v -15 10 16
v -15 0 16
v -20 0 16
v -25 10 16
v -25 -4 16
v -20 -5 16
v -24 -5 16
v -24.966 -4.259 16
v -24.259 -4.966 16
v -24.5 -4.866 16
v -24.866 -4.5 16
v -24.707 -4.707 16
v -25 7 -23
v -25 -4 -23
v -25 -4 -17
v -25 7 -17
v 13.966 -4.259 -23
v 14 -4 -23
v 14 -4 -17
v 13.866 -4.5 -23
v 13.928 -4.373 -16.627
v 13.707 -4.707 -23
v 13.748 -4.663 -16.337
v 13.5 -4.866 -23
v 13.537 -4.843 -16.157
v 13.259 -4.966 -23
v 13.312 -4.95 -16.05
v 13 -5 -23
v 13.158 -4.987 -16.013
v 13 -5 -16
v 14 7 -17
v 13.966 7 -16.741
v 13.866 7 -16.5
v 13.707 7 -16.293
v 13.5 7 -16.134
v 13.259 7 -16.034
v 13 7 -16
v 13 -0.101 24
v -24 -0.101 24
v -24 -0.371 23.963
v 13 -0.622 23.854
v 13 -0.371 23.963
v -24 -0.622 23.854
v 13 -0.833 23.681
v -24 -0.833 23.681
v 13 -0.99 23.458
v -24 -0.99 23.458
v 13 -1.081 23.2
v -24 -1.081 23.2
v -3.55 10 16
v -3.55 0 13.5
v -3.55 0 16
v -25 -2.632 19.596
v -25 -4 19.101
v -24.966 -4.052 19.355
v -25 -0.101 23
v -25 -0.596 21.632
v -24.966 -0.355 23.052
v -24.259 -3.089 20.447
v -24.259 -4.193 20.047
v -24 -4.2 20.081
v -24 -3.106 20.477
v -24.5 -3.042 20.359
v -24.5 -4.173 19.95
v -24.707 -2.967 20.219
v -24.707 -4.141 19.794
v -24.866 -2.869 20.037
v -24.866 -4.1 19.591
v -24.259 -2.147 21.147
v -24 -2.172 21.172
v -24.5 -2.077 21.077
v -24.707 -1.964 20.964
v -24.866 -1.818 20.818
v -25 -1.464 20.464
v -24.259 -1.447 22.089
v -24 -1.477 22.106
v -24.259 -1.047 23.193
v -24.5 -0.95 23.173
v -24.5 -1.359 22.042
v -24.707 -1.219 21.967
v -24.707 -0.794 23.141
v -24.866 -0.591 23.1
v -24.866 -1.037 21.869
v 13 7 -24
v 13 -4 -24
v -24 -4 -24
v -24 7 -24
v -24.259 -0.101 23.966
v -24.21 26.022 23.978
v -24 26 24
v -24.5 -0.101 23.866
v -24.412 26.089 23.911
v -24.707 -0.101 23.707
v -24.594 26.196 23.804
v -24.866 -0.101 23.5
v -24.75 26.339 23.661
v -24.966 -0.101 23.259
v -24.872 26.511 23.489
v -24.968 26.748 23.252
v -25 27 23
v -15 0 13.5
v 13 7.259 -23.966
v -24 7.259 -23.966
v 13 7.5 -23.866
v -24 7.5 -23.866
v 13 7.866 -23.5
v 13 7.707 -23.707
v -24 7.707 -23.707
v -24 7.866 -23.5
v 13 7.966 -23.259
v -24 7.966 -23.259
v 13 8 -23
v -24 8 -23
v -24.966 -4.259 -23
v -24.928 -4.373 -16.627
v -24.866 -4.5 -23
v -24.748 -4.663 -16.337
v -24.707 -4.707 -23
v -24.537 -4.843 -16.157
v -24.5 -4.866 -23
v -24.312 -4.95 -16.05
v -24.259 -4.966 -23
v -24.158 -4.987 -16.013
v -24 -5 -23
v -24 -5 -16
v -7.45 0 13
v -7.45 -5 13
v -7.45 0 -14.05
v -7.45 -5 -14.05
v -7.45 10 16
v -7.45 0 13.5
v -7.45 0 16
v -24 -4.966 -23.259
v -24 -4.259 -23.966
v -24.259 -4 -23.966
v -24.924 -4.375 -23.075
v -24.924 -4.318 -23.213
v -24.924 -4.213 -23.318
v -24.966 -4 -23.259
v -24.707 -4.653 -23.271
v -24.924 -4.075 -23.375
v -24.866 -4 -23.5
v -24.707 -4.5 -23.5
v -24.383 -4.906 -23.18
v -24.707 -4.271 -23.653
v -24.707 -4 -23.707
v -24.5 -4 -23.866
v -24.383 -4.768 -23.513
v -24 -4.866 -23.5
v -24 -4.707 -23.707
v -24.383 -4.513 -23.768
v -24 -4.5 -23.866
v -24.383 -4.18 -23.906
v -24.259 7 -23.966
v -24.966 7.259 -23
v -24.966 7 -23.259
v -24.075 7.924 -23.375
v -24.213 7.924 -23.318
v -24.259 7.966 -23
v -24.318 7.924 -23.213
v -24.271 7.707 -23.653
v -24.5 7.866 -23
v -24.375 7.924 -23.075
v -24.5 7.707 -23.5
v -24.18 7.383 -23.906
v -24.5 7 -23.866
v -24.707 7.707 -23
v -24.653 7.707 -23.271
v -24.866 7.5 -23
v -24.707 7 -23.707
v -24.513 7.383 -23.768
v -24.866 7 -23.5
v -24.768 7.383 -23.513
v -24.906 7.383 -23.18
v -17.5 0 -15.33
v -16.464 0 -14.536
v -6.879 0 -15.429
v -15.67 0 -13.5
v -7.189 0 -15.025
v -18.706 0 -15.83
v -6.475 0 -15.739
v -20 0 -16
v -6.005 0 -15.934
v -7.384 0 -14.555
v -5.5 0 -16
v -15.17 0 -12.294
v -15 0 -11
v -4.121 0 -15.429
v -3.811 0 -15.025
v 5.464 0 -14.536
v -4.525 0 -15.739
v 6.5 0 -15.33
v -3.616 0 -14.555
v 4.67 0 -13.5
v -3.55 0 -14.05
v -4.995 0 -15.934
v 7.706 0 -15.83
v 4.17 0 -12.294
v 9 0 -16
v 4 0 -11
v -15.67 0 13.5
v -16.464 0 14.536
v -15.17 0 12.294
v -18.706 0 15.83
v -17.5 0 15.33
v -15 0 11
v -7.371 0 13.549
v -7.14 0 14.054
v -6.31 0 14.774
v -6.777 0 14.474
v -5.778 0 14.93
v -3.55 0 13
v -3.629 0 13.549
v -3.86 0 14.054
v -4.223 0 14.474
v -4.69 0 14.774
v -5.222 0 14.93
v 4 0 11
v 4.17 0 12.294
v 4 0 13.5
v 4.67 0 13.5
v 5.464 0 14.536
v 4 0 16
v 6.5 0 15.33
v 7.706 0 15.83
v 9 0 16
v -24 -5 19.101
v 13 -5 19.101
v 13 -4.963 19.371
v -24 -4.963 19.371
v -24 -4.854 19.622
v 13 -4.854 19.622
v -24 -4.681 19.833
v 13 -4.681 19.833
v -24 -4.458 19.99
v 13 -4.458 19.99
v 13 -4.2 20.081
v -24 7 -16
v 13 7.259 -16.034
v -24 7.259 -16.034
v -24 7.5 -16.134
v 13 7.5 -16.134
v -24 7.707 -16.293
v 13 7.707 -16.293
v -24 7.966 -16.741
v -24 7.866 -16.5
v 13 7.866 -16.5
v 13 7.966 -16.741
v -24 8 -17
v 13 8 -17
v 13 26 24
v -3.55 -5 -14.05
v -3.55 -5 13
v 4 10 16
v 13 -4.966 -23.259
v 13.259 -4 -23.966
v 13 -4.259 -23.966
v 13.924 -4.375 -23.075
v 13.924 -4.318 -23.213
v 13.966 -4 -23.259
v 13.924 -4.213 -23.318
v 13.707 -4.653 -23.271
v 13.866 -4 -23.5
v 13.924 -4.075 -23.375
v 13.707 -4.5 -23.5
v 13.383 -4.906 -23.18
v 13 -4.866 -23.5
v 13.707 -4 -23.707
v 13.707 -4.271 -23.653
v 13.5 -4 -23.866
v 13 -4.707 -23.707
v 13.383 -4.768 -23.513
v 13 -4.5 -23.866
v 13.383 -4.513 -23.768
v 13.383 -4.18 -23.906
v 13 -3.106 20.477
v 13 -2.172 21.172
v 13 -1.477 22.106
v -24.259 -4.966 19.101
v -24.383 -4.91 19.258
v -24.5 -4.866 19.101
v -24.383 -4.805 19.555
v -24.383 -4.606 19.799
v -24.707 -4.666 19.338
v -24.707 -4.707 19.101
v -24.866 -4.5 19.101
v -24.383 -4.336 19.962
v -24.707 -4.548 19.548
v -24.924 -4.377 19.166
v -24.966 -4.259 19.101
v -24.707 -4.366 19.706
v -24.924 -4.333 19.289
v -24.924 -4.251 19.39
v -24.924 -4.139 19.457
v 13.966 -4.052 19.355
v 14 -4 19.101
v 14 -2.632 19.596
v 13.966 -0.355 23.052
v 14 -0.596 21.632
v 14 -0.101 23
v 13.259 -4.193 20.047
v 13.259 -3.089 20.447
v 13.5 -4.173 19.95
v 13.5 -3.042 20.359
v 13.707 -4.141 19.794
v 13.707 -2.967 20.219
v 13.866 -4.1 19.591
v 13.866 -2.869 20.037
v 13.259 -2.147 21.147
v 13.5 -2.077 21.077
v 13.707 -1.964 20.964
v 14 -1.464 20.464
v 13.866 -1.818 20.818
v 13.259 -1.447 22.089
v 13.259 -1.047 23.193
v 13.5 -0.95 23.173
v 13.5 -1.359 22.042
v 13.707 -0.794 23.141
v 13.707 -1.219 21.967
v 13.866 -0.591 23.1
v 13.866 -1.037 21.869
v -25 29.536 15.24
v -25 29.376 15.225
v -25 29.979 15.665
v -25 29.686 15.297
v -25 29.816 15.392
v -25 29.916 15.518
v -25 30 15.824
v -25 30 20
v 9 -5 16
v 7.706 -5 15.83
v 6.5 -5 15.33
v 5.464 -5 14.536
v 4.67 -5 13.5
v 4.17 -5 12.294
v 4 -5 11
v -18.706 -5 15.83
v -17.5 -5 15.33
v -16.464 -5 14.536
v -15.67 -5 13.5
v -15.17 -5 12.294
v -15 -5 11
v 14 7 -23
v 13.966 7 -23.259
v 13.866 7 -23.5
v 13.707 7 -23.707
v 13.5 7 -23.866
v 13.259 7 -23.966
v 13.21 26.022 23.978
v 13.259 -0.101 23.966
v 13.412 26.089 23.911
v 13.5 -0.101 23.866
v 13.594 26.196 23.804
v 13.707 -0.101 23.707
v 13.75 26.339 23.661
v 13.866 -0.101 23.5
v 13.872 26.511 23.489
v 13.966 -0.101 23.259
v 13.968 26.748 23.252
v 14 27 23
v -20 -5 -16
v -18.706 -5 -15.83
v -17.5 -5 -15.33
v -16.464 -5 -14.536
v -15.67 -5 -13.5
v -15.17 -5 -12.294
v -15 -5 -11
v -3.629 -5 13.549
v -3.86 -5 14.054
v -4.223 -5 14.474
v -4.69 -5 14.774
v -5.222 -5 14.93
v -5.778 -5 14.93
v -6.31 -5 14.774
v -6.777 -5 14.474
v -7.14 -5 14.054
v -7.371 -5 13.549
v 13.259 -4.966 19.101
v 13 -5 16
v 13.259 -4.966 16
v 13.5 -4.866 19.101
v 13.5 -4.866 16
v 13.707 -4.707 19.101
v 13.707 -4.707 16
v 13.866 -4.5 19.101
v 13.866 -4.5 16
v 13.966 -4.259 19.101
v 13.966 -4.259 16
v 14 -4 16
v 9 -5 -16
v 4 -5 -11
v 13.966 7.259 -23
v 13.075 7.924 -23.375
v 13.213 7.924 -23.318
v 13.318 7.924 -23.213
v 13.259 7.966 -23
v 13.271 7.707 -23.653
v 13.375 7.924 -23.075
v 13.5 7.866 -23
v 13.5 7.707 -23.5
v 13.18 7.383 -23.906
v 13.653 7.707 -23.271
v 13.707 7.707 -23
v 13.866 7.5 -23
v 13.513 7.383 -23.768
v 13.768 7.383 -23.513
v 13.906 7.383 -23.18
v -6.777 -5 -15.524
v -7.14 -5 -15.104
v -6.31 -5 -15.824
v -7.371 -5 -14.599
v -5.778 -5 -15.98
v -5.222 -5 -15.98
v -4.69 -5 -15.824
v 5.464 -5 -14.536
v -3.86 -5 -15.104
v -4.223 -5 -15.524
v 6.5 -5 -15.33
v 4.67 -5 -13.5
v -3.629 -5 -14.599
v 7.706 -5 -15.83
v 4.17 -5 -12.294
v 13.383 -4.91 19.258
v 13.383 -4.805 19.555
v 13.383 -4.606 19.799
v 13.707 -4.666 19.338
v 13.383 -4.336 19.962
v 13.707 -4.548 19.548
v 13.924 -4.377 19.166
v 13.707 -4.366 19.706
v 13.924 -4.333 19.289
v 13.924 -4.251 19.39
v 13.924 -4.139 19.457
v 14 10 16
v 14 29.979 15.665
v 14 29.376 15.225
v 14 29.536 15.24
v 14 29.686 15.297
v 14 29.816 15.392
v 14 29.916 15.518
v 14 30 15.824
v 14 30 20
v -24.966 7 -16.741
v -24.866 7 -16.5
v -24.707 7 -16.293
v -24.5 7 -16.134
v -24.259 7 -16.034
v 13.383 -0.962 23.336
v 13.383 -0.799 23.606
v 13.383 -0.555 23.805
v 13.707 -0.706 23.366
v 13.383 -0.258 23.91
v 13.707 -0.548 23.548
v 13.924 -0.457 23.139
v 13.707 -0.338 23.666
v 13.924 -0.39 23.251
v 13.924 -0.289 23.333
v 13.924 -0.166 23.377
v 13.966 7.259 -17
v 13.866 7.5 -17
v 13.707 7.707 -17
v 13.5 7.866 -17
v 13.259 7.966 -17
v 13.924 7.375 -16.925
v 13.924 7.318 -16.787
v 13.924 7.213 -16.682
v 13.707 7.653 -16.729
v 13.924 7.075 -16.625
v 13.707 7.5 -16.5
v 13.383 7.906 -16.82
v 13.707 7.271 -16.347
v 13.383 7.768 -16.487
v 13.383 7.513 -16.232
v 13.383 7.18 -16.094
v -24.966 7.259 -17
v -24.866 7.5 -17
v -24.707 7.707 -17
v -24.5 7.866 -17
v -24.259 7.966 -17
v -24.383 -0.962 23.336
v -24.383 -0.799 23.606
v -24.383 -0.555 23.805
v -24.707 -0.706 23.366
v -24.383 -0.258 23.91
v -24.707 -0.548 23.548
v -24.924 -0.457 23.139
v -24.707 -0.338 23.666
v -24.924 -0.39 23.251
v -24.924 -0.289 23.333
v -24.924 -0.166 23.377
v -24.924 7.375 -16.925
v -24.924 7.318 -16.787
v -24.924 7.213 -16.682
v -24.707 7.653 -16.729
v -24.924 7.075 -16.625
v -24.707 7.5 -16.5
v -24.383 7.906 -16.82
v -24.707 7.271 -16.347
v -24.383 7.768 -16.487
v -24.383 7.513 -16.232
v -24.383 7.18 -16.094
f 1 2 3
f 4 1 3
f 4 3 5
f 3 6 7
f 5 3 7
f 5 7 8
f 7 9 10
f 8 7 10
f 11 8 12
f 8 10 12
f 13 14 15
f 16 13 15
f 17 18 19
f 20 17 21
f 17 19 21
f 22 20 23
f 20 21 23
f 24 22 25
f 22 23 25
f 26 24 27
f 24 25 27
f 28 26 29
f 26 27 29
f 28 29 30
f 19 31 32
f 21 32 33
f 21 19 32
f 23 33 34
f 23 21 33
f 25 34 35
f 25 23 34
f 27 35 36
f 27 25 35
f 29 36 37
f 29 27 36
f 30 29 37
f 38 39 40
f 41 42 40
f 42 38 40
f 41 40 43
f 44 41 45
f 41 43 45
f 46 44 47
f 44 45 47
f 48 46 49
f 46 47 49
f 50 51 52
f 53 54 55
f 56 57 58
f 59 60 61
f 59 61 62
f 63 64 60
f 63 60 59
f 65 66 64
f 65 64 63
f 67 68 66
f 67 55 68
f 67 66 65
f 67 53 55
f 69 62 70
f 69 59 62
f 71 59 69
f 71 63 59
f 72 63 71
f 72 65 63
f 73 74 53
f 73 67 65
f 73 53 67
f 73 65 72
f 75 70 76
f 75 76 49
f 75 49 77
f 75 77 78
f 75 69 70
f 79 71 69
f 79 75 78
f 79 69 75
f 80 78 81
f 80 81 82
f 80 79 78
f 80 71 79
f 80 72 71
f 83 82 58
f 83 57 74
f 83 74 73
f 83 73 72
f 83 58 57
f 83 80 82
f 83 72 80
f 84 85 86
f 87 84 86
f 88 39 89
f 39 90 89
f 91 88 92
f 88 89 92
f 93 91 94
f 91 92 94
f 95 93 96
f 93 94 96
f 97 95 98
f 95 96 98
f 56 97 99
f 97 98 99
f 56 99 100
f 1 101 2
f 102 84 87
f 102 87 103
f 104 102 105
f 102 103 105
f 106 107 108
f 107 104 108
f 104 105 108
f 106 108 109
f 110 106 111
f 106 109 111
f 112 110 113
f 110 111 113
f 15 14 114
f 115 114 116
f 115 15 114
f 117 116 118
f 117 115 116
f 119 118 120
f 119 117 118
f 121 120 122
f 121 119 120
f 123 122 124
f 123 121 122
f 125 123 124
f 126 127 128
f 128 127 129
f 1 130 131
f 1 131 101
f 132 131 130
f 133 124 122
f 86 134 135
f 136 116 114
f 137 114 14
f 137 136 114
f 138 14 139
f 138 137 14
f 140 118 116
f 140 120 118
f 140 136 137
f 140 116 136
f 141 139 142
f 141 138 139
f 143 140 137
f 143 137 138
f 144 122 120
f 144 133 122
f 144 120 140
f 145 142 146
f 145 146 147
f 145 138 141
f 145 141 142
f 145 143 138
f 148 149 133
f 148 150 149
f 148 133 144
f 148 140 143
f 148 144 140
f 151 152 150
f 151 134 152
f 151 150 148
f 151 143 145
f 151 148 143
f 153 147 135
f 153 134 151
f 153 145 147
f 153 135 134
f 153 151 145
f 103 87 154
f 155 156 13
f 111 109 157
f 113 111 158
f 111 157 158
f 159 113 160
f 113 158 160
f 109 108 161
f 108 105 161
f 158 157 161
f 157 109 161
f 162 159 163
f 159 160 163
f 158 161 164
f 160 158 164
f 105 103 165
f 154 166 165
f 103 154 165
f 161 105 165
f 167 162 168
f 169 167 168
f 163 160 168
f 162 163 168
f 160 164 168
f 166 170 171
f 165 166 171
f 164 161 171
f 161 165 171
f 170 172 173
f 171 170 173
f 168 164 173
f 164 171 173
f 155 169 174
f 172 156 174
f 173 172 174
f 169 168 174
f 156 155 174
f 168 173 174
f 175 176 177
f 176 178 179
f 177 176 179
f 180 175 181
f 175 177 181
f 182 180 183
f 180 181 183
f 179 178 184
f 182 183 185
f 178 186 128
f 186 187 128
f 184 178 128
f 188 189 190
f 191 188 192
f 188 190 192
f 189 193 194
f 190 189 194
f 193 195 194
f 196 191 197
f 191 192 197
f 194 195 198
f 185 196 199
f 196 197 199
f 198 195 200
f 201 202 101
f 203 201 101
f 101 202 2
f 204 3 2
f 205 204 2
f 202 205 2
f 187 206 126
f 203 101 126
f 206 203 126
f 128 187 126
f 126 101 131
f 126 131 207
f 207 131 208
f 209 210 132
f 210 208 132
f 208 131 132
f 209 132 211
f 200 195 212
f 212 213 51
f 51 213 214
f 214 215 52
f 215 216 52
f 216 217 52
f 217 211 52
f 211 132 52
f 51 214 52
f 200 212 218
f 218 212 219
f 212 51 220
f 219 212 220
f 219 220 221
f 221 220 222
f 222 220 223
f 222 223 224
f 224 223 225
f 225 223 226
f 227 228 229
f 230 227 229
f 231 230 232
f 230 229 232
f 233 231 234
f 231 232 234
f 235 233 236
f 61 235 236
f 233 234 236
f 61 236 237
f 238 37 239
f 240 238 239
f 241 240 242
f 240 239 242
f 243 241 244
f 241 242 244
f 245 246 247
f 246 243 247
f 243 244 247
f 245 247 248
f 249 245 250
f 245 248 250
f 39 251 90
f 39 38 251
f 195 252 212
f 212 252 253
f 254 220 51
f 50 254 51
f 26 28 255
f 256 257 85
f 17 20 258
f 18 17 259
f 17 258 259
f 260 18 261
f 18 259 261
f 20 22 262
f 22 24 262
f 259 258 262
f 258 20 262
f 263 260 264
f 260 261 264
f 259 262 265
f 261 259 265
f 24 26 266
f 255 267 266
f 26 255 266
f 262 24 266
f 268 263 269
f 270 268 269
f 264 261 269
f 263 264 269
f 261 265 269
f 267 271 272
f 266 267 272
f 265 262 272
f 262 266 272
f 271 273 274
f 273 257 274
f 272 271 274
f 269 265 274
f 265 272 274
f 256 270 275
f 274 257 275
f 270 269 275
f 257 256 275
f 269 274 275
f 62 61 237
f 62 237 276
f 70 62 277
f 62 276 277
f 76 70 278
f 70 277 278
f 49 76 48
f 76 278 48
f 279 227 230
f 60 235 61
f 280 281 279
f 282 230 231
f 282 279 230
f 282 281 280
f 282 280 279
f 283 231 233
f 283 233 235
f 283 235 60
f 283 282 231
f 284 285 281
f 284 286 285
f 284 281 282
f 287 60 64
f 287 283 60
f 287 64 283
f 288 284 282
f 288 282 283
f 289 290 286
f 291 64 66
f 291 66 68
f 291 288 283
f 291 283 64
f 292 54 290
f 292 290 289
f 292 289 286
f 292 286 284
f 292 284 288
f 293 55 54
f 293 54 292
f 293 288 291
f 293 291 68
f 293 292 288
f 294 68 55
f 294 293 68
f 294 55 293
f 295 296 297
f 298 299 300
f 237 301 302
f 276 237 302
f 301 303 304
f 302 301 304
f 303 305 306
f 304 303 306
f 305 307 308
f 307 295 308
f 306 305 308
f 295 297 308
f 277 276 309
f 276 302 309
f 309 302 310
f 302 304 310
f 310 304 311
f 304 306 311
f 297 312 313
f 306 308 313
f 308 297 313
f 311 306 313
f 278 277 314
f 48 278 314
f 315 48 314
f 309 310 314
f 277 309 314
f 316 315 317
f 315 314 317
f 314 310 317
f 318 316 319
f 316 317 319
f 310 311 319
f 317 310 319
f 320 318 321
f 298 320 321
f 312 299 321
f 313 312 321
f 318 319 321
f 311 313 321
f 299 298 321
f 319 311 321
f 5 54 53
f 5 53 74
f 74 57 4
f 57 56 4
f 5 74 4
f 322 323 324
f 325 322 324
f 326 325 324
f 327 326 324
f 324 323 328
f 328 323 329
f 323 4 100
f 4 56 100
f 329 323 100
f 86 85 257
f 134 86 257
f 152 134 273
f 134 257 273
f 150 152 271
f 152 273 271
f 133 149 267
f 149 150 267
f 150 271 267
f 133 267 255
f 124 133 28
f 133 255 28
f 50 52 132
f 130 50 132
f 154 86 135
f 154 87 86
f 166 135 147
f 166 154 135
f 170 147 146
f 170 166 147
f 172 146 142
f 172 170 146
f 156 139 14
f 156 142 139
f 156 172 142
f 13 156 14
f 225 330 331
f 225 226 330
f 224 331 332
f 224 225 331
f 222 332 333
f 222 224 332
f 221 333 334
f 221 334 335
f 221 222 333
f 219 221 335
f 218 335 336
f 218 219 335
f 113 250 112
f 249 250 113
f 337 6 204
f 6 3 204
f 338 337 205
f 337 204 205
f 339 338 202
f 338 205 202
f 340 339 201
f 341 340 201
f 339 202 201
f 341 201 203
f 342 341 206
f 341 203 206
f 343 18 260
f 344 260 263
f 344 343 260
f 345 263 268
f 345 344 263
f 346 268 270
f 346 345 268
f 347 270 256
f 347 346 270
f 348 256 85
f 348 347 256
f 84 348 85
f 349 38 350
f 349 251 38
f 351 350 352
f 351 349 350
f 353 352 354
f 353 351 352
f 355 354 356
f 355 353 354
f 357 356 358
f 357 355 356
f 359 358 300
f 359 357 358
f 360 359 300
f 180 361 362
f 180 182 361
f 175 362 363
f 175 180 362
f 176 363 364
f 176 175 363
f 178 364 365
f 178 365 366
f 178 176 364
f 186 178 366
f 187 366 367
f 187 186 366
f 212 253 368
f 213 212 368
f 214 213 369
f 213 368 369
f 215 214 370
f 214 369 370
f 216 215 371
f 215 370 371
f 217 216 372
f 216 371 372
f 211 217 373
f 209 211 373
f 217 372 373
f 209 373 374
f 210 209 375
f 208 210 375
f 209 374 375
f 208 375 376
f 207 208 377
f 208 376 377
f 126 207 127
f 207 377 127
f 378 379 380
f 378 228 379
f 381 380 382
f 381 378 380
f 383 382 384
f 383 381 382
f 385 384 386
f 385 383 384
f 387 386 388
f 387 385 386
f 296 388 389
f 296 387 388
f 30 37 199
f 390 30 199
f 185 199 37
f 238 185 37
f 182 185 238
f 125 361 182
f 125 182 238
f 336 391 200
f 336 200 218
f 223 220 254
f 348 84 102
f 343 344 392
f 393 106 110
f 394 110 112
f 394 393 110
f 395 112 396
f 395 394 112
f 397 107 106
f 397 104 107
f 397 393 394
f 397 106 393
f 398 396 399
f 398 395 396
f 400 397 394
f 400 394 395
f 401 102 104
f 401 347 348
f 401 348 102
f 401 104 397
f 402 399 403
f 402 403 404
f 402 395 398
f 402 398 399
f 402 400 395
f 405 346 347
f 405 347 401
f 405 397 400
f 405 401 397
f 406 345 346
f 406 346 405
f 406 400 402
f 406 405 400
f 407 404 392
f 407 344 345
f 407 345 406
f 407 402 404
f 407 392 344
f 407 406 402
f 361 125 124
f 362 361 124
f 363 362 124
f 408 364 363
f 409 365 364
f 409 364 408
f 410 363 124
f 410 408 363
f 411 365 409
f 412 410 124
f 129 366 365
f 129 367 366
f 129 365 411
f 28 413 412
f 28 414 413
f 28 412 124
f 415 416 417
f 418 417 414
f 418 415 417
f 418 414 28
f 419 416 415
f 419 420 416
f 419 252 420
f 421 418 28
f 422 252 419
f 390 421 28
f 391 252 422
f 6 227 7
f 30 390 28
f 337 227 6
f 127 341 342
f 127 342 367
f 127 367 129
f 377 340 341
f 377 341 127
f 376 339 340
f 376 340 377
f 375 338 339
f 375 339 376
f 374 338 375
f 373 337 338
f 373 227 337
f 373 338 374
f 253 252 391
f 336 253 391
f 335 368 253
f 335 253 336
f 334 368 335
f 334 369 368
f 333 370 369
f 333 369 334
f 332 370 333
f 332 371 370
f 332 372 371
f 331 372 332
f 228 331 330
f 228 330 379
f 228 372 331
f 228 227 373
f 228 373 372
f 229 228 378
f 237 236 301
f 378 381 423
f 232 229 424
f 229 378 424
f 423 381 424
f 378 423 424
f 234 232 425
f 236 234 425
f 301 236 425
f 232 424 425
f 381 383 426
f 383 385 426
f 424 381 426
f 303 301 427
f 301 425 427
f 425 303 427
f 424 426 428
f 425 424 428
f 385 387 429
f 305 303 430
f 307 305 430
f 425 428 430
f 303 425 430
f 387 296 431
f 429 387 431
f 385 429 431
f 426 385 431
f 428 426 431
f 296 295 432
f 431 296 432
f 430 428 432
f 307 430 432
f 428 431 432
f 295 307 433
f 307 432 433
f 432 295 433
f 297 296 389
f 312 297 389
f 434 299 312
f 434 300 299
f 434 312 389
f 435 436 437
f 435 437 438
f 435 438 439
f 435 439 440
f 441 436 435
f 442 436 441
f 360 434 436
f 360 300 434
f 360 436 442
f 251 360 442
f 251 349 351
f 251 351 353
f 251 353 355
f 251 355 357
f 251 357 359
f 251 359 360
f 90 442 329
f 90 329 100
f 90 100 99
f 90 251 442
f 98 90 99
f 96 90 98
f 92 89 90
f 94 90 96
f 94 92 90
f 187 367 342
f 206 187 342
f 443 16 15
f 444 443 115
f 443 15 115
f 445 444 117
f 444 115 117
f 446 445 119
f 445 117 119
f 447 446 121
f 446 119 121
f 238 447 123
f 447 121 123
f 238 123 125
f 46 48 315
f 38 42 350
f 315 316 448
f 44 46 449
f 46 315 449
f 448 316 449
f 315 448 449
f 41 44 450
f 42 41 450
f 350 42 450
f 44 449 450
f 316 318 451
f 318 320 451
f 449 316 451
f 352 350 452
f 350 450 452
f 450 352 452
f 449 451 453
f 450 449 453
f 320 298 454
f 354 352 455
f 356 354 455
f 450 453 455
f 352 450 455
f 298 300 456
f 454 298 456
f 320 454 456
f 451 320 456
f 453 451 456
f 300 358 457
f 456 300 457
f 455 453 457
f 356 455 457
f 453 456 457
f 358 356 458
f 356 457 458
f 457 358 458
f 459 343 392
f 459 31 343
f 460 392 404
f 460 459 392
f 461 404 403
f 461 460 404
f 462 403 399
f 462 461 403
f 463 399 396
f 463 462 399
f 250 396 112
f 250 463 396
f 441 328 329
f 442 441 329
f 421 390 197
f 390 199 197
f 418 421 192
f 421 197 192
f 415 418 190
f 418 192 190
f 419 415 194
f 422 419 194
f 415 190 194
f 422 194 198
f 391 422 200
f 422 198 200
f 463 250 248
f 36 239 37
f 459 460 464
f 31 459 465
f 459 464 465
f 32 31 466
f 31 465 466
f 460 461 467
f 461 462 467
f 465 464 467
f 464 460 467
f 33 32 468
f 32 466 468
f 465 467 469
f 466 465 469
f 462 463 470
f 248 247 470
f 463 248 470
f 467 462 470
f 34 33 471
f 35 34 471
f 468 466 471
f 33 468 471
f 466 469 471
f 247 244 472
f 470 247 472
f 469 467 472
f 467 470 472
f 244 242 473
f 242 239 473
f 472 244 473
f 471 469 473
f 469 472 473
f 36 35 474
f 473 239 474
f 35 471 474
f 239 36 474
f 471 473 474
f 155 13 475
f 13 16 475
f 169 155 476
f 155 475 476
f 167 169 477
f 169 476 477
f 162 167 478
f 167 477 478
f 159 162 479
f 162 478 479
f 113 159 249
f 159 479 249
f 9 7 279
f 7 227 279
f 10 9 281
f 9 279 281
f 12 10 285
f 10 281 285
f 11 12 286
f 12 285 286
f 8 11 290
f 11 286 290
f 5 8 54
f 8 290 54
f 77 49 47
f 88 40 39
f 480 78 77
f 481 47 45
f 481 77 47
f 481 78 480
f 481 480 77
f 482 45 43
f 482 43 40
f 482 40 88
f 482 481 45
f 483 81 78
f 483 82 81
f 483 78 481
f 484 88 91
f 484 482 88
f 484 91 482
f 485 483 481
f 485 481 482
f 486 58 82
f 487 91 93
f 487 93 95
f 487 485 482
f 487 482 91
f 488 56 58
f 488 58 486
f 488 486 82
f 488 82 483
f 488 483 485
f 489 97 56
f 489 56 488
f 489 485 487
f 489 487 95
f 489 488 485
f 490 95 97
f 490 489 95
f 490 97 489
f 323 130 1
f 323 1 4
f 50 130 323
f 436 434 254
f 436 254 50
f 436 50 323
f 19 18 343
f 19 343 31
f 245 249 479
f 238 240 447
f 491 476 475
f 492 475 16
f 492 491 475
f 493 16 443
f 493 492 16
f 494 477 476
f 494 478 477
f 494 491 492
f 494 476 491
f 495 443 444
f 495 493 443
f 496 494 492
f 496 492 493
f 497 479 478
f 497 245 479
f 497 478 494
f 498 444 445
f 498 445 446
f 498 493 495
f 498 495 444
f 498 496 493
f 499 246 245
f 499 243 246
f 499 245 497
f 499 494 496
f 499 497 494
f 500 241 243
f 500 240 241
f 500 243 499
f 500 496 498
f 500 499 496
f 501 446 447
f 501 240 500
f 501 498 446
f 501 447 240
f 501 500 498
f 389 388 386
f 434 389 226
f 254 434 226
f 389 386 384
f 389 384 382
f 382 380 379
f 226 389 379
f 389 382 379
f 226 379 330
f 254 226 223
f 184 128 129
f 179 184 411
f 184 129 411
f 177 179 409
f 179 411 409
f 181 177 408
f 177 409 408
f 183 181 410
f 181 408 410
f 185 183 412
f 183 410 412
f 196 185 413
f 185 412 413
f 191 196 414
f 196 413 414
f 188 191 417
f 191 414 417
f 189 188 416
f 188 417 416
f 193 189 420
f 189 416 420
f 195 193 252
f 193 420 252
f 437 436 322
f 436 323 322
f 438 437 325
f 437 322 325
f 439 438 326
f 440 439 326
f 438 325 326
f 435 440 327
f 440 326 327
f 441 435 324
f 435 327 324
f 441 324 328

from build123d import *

# Parameters (mm, degrees)
F0_W      = 39
F0_H      = 48
F1_DEPTH  = 5
F2_W      = 10
F2_H      = 32
F3_DEPTH  = 5.001
F4_W      = 39
F4_H      = 8
F5_DEPTH  = 30
F7_DEPTH  = 39
F8_R      = 4
F9_DEPTH  = 39.001
F10_R     = 1
F11_SIZE  = 4
F12_W     = 39
F12_H     = 8
F13_DEPTH = 8
F15_DEPTH = 35.001
F16_R     = 1
F17_R     = 5
F18_R     = 0.6
F19_W     = 7.55
F19_H     = 2.5
F20_DEPTH = 10
F21_SIZE2 = 9.99999
F21_SIZE  = 2.49999
F22_SIZE2 = 2.49999
F22_SIZE  = 9.99999


# Not quite as in the source:
# - a fillet or chamfer is up to 0.001 mm smaller than in the source, because OpenCascade refuses the exact size


with BuildPart() as f1:
    # F0 (on Front) → F1 (new body)
    with BuildSketch(Plane.XZ):
        with Locations((-5.5, 0)):
            Rectangle(F0_W, F0_H)
    extrude(amount=F1_DEPTH)

    # F2 (on face) → F3 (cut, through all)
    with BuildSketch(Plane.XZ.offset(5)):
        with Locations((-20, 0)):
            Rectangle(F2_W, F2_H)
        with Locations((9, 0)):
            Rectangle(F2_W, F2_H)
    extrude(amount=-F3_DEPTH, mode=Mode.SUBTRACT)

    # F4 (on face) → F5 (join)
    with BuildSketch(Plane(origin=(0, 0, 0), x_dir=(-1, 0, 0), z_dir=(0, 1, 0))):
        with Locations((5.5, 20)):
            Rectangle(F4_W, F4_H)
    extrude(amount=F5_DEPTH)

    # F6 (on face) → F7 (join, through all)
    with BuildSketch(Plane.YZ.offset(14)):
        Polygon((30, 16), (10, 16), (30, 15.2), align=None)
    extrude(amount=-F7_DEPTH)

    # F8 (on face) → F9 (cut, through all)
    with BuildSketch(Plane.YZ.offset(14)):
        with Locations((-5, 24)):
            Circle(F8_R)
    extrude(amount=-F9_DEPTH, mode=Mode.SUBTRACT)

    # F10
    f10_edges = [f1.edges().sort_by_distance(p)[0] for p in [
        (-5.5, -1, 24),
        (-5.5, -5, 20),
    ]]
    fillet(f10_edges, radius=F10_R)

    # F11
    f11_edges = [f1.edges().sort_by_distance(p)[0] for p in [
        (-5.5, 30, 24),
    ]]
    chamfer(f11_edges, length=F11_SIZE)

    # F12 (on face) → F13 (join)
    with BuildSketch(Plane(origin=(0, 0, 0), x_dir=(-1, 0, 0), z_dir=(0, 1, 0))):
        with Locations((5.5, -20)):
            Rectangle(F12_W, F12_H)
    extrude(amount=F13_DEPTH)

    # F14 (on face) → F15 (cut, through all)
    with BuildSketch(Plane.XZ.offset(5)):
        with BuildLine():
            Line((-3.55, -14.05), (-3.55, 13))
            ThreePointArc((-3.55, 13), (-5.5, 14.95), (-7.45, 13))
            Line((-7.45, 13), (-7.45, -14.05))
            ThreePointArc((-7.45, -14.05), (-5.5, -16), (-3.55, -14.05))
        make_face()
    extrude(amount=-F15_DEPTH, mode=Mode.SUBTRACT)

    # F16
    f16_edges = [f1.edges().sort_by_distance(p)[0] for p in [
        (-5.5, -4.2, 20.080816),
        (-5.5, -5, -24),
        (-25, -5, -20),
        (14, -5, -20),
        (14, -5, 17.55051),
        (-25, -5, 17.55051),
        (-25, 12.94949, 24),
        (14, 12.94949, 24),
        (14, 1.5, -24),
        (-25, 1.5, -24),
        (-5.5, 8, -16),
        (-5.5, 8, -24),
        (14, 8, -20),
        (-25, 8, -20),
        (-25, 1.5, -16),
        (14, 1.5, -16),
    ]]
    fillet(f16_edges, radius=F16_R)

    # F17
    f17_edges = [f1.edges().sort_by_distance(p)[0] for p in [
        (-15, -2.5, 16),
        (-15, -2.5, -16),
        (4, -2.5, 16),
        (4, -2.5, -16),
    ]]
    fillet(f17_edges, radius=F17_R)

    # F18
    f18_edges = [f1.edges().sort_by_distance(p)[0] for p in [
        (-5.5, 30, 15.2),
    ]]
    fillet(f18_edges, radius=F18_R)

    # F19 (on face) → F20 (join)
    with BuildSketch(Plane(origin=(0, 0, 0), x_dir=(-1, 0, 0), z_dir=(0, 1, 0))):
        with Locations((-0.225, 14.75)):
            Rectangle(F19_W, F19_H)
        with Locations((11.225, 14.75)):
            Rectangle(F19_W, F19_H)
    extrude(amount=F20_DEPTH)

    # F21 (size 2.5 and 10 in the source; OpenCascade refuses exactly that, so slightly less here)
    f21_edges = [f1.edges().sort_by_distance(p)[0] for p in [
        (0.225, 10, 13.5),
    ]]
    f21_side = f1.faces().sort_by_distance((0.225, 10, 14.75))[0]
    chamfer(f21_edges, length=F21_SIZE, length2=F21_SIZE2, reference=f21_side)

    # F22 (size 10 and 2.5 in the source; OpenCascade refuses exactly that, so slightly less here)
    f22_edges = [f1.edges().sort_by_distance(p)[0] for p in [
        (-11.225, 10, 13.5),
    ]]
    f22_side = f1.faces().sort_by_distance((-11.225, 5, 13.5))[0]
    chamfer(f22_edges, length=F22_SIZE, length2=F22_SIZE2, reference=f22_side)


solid = f1.part
